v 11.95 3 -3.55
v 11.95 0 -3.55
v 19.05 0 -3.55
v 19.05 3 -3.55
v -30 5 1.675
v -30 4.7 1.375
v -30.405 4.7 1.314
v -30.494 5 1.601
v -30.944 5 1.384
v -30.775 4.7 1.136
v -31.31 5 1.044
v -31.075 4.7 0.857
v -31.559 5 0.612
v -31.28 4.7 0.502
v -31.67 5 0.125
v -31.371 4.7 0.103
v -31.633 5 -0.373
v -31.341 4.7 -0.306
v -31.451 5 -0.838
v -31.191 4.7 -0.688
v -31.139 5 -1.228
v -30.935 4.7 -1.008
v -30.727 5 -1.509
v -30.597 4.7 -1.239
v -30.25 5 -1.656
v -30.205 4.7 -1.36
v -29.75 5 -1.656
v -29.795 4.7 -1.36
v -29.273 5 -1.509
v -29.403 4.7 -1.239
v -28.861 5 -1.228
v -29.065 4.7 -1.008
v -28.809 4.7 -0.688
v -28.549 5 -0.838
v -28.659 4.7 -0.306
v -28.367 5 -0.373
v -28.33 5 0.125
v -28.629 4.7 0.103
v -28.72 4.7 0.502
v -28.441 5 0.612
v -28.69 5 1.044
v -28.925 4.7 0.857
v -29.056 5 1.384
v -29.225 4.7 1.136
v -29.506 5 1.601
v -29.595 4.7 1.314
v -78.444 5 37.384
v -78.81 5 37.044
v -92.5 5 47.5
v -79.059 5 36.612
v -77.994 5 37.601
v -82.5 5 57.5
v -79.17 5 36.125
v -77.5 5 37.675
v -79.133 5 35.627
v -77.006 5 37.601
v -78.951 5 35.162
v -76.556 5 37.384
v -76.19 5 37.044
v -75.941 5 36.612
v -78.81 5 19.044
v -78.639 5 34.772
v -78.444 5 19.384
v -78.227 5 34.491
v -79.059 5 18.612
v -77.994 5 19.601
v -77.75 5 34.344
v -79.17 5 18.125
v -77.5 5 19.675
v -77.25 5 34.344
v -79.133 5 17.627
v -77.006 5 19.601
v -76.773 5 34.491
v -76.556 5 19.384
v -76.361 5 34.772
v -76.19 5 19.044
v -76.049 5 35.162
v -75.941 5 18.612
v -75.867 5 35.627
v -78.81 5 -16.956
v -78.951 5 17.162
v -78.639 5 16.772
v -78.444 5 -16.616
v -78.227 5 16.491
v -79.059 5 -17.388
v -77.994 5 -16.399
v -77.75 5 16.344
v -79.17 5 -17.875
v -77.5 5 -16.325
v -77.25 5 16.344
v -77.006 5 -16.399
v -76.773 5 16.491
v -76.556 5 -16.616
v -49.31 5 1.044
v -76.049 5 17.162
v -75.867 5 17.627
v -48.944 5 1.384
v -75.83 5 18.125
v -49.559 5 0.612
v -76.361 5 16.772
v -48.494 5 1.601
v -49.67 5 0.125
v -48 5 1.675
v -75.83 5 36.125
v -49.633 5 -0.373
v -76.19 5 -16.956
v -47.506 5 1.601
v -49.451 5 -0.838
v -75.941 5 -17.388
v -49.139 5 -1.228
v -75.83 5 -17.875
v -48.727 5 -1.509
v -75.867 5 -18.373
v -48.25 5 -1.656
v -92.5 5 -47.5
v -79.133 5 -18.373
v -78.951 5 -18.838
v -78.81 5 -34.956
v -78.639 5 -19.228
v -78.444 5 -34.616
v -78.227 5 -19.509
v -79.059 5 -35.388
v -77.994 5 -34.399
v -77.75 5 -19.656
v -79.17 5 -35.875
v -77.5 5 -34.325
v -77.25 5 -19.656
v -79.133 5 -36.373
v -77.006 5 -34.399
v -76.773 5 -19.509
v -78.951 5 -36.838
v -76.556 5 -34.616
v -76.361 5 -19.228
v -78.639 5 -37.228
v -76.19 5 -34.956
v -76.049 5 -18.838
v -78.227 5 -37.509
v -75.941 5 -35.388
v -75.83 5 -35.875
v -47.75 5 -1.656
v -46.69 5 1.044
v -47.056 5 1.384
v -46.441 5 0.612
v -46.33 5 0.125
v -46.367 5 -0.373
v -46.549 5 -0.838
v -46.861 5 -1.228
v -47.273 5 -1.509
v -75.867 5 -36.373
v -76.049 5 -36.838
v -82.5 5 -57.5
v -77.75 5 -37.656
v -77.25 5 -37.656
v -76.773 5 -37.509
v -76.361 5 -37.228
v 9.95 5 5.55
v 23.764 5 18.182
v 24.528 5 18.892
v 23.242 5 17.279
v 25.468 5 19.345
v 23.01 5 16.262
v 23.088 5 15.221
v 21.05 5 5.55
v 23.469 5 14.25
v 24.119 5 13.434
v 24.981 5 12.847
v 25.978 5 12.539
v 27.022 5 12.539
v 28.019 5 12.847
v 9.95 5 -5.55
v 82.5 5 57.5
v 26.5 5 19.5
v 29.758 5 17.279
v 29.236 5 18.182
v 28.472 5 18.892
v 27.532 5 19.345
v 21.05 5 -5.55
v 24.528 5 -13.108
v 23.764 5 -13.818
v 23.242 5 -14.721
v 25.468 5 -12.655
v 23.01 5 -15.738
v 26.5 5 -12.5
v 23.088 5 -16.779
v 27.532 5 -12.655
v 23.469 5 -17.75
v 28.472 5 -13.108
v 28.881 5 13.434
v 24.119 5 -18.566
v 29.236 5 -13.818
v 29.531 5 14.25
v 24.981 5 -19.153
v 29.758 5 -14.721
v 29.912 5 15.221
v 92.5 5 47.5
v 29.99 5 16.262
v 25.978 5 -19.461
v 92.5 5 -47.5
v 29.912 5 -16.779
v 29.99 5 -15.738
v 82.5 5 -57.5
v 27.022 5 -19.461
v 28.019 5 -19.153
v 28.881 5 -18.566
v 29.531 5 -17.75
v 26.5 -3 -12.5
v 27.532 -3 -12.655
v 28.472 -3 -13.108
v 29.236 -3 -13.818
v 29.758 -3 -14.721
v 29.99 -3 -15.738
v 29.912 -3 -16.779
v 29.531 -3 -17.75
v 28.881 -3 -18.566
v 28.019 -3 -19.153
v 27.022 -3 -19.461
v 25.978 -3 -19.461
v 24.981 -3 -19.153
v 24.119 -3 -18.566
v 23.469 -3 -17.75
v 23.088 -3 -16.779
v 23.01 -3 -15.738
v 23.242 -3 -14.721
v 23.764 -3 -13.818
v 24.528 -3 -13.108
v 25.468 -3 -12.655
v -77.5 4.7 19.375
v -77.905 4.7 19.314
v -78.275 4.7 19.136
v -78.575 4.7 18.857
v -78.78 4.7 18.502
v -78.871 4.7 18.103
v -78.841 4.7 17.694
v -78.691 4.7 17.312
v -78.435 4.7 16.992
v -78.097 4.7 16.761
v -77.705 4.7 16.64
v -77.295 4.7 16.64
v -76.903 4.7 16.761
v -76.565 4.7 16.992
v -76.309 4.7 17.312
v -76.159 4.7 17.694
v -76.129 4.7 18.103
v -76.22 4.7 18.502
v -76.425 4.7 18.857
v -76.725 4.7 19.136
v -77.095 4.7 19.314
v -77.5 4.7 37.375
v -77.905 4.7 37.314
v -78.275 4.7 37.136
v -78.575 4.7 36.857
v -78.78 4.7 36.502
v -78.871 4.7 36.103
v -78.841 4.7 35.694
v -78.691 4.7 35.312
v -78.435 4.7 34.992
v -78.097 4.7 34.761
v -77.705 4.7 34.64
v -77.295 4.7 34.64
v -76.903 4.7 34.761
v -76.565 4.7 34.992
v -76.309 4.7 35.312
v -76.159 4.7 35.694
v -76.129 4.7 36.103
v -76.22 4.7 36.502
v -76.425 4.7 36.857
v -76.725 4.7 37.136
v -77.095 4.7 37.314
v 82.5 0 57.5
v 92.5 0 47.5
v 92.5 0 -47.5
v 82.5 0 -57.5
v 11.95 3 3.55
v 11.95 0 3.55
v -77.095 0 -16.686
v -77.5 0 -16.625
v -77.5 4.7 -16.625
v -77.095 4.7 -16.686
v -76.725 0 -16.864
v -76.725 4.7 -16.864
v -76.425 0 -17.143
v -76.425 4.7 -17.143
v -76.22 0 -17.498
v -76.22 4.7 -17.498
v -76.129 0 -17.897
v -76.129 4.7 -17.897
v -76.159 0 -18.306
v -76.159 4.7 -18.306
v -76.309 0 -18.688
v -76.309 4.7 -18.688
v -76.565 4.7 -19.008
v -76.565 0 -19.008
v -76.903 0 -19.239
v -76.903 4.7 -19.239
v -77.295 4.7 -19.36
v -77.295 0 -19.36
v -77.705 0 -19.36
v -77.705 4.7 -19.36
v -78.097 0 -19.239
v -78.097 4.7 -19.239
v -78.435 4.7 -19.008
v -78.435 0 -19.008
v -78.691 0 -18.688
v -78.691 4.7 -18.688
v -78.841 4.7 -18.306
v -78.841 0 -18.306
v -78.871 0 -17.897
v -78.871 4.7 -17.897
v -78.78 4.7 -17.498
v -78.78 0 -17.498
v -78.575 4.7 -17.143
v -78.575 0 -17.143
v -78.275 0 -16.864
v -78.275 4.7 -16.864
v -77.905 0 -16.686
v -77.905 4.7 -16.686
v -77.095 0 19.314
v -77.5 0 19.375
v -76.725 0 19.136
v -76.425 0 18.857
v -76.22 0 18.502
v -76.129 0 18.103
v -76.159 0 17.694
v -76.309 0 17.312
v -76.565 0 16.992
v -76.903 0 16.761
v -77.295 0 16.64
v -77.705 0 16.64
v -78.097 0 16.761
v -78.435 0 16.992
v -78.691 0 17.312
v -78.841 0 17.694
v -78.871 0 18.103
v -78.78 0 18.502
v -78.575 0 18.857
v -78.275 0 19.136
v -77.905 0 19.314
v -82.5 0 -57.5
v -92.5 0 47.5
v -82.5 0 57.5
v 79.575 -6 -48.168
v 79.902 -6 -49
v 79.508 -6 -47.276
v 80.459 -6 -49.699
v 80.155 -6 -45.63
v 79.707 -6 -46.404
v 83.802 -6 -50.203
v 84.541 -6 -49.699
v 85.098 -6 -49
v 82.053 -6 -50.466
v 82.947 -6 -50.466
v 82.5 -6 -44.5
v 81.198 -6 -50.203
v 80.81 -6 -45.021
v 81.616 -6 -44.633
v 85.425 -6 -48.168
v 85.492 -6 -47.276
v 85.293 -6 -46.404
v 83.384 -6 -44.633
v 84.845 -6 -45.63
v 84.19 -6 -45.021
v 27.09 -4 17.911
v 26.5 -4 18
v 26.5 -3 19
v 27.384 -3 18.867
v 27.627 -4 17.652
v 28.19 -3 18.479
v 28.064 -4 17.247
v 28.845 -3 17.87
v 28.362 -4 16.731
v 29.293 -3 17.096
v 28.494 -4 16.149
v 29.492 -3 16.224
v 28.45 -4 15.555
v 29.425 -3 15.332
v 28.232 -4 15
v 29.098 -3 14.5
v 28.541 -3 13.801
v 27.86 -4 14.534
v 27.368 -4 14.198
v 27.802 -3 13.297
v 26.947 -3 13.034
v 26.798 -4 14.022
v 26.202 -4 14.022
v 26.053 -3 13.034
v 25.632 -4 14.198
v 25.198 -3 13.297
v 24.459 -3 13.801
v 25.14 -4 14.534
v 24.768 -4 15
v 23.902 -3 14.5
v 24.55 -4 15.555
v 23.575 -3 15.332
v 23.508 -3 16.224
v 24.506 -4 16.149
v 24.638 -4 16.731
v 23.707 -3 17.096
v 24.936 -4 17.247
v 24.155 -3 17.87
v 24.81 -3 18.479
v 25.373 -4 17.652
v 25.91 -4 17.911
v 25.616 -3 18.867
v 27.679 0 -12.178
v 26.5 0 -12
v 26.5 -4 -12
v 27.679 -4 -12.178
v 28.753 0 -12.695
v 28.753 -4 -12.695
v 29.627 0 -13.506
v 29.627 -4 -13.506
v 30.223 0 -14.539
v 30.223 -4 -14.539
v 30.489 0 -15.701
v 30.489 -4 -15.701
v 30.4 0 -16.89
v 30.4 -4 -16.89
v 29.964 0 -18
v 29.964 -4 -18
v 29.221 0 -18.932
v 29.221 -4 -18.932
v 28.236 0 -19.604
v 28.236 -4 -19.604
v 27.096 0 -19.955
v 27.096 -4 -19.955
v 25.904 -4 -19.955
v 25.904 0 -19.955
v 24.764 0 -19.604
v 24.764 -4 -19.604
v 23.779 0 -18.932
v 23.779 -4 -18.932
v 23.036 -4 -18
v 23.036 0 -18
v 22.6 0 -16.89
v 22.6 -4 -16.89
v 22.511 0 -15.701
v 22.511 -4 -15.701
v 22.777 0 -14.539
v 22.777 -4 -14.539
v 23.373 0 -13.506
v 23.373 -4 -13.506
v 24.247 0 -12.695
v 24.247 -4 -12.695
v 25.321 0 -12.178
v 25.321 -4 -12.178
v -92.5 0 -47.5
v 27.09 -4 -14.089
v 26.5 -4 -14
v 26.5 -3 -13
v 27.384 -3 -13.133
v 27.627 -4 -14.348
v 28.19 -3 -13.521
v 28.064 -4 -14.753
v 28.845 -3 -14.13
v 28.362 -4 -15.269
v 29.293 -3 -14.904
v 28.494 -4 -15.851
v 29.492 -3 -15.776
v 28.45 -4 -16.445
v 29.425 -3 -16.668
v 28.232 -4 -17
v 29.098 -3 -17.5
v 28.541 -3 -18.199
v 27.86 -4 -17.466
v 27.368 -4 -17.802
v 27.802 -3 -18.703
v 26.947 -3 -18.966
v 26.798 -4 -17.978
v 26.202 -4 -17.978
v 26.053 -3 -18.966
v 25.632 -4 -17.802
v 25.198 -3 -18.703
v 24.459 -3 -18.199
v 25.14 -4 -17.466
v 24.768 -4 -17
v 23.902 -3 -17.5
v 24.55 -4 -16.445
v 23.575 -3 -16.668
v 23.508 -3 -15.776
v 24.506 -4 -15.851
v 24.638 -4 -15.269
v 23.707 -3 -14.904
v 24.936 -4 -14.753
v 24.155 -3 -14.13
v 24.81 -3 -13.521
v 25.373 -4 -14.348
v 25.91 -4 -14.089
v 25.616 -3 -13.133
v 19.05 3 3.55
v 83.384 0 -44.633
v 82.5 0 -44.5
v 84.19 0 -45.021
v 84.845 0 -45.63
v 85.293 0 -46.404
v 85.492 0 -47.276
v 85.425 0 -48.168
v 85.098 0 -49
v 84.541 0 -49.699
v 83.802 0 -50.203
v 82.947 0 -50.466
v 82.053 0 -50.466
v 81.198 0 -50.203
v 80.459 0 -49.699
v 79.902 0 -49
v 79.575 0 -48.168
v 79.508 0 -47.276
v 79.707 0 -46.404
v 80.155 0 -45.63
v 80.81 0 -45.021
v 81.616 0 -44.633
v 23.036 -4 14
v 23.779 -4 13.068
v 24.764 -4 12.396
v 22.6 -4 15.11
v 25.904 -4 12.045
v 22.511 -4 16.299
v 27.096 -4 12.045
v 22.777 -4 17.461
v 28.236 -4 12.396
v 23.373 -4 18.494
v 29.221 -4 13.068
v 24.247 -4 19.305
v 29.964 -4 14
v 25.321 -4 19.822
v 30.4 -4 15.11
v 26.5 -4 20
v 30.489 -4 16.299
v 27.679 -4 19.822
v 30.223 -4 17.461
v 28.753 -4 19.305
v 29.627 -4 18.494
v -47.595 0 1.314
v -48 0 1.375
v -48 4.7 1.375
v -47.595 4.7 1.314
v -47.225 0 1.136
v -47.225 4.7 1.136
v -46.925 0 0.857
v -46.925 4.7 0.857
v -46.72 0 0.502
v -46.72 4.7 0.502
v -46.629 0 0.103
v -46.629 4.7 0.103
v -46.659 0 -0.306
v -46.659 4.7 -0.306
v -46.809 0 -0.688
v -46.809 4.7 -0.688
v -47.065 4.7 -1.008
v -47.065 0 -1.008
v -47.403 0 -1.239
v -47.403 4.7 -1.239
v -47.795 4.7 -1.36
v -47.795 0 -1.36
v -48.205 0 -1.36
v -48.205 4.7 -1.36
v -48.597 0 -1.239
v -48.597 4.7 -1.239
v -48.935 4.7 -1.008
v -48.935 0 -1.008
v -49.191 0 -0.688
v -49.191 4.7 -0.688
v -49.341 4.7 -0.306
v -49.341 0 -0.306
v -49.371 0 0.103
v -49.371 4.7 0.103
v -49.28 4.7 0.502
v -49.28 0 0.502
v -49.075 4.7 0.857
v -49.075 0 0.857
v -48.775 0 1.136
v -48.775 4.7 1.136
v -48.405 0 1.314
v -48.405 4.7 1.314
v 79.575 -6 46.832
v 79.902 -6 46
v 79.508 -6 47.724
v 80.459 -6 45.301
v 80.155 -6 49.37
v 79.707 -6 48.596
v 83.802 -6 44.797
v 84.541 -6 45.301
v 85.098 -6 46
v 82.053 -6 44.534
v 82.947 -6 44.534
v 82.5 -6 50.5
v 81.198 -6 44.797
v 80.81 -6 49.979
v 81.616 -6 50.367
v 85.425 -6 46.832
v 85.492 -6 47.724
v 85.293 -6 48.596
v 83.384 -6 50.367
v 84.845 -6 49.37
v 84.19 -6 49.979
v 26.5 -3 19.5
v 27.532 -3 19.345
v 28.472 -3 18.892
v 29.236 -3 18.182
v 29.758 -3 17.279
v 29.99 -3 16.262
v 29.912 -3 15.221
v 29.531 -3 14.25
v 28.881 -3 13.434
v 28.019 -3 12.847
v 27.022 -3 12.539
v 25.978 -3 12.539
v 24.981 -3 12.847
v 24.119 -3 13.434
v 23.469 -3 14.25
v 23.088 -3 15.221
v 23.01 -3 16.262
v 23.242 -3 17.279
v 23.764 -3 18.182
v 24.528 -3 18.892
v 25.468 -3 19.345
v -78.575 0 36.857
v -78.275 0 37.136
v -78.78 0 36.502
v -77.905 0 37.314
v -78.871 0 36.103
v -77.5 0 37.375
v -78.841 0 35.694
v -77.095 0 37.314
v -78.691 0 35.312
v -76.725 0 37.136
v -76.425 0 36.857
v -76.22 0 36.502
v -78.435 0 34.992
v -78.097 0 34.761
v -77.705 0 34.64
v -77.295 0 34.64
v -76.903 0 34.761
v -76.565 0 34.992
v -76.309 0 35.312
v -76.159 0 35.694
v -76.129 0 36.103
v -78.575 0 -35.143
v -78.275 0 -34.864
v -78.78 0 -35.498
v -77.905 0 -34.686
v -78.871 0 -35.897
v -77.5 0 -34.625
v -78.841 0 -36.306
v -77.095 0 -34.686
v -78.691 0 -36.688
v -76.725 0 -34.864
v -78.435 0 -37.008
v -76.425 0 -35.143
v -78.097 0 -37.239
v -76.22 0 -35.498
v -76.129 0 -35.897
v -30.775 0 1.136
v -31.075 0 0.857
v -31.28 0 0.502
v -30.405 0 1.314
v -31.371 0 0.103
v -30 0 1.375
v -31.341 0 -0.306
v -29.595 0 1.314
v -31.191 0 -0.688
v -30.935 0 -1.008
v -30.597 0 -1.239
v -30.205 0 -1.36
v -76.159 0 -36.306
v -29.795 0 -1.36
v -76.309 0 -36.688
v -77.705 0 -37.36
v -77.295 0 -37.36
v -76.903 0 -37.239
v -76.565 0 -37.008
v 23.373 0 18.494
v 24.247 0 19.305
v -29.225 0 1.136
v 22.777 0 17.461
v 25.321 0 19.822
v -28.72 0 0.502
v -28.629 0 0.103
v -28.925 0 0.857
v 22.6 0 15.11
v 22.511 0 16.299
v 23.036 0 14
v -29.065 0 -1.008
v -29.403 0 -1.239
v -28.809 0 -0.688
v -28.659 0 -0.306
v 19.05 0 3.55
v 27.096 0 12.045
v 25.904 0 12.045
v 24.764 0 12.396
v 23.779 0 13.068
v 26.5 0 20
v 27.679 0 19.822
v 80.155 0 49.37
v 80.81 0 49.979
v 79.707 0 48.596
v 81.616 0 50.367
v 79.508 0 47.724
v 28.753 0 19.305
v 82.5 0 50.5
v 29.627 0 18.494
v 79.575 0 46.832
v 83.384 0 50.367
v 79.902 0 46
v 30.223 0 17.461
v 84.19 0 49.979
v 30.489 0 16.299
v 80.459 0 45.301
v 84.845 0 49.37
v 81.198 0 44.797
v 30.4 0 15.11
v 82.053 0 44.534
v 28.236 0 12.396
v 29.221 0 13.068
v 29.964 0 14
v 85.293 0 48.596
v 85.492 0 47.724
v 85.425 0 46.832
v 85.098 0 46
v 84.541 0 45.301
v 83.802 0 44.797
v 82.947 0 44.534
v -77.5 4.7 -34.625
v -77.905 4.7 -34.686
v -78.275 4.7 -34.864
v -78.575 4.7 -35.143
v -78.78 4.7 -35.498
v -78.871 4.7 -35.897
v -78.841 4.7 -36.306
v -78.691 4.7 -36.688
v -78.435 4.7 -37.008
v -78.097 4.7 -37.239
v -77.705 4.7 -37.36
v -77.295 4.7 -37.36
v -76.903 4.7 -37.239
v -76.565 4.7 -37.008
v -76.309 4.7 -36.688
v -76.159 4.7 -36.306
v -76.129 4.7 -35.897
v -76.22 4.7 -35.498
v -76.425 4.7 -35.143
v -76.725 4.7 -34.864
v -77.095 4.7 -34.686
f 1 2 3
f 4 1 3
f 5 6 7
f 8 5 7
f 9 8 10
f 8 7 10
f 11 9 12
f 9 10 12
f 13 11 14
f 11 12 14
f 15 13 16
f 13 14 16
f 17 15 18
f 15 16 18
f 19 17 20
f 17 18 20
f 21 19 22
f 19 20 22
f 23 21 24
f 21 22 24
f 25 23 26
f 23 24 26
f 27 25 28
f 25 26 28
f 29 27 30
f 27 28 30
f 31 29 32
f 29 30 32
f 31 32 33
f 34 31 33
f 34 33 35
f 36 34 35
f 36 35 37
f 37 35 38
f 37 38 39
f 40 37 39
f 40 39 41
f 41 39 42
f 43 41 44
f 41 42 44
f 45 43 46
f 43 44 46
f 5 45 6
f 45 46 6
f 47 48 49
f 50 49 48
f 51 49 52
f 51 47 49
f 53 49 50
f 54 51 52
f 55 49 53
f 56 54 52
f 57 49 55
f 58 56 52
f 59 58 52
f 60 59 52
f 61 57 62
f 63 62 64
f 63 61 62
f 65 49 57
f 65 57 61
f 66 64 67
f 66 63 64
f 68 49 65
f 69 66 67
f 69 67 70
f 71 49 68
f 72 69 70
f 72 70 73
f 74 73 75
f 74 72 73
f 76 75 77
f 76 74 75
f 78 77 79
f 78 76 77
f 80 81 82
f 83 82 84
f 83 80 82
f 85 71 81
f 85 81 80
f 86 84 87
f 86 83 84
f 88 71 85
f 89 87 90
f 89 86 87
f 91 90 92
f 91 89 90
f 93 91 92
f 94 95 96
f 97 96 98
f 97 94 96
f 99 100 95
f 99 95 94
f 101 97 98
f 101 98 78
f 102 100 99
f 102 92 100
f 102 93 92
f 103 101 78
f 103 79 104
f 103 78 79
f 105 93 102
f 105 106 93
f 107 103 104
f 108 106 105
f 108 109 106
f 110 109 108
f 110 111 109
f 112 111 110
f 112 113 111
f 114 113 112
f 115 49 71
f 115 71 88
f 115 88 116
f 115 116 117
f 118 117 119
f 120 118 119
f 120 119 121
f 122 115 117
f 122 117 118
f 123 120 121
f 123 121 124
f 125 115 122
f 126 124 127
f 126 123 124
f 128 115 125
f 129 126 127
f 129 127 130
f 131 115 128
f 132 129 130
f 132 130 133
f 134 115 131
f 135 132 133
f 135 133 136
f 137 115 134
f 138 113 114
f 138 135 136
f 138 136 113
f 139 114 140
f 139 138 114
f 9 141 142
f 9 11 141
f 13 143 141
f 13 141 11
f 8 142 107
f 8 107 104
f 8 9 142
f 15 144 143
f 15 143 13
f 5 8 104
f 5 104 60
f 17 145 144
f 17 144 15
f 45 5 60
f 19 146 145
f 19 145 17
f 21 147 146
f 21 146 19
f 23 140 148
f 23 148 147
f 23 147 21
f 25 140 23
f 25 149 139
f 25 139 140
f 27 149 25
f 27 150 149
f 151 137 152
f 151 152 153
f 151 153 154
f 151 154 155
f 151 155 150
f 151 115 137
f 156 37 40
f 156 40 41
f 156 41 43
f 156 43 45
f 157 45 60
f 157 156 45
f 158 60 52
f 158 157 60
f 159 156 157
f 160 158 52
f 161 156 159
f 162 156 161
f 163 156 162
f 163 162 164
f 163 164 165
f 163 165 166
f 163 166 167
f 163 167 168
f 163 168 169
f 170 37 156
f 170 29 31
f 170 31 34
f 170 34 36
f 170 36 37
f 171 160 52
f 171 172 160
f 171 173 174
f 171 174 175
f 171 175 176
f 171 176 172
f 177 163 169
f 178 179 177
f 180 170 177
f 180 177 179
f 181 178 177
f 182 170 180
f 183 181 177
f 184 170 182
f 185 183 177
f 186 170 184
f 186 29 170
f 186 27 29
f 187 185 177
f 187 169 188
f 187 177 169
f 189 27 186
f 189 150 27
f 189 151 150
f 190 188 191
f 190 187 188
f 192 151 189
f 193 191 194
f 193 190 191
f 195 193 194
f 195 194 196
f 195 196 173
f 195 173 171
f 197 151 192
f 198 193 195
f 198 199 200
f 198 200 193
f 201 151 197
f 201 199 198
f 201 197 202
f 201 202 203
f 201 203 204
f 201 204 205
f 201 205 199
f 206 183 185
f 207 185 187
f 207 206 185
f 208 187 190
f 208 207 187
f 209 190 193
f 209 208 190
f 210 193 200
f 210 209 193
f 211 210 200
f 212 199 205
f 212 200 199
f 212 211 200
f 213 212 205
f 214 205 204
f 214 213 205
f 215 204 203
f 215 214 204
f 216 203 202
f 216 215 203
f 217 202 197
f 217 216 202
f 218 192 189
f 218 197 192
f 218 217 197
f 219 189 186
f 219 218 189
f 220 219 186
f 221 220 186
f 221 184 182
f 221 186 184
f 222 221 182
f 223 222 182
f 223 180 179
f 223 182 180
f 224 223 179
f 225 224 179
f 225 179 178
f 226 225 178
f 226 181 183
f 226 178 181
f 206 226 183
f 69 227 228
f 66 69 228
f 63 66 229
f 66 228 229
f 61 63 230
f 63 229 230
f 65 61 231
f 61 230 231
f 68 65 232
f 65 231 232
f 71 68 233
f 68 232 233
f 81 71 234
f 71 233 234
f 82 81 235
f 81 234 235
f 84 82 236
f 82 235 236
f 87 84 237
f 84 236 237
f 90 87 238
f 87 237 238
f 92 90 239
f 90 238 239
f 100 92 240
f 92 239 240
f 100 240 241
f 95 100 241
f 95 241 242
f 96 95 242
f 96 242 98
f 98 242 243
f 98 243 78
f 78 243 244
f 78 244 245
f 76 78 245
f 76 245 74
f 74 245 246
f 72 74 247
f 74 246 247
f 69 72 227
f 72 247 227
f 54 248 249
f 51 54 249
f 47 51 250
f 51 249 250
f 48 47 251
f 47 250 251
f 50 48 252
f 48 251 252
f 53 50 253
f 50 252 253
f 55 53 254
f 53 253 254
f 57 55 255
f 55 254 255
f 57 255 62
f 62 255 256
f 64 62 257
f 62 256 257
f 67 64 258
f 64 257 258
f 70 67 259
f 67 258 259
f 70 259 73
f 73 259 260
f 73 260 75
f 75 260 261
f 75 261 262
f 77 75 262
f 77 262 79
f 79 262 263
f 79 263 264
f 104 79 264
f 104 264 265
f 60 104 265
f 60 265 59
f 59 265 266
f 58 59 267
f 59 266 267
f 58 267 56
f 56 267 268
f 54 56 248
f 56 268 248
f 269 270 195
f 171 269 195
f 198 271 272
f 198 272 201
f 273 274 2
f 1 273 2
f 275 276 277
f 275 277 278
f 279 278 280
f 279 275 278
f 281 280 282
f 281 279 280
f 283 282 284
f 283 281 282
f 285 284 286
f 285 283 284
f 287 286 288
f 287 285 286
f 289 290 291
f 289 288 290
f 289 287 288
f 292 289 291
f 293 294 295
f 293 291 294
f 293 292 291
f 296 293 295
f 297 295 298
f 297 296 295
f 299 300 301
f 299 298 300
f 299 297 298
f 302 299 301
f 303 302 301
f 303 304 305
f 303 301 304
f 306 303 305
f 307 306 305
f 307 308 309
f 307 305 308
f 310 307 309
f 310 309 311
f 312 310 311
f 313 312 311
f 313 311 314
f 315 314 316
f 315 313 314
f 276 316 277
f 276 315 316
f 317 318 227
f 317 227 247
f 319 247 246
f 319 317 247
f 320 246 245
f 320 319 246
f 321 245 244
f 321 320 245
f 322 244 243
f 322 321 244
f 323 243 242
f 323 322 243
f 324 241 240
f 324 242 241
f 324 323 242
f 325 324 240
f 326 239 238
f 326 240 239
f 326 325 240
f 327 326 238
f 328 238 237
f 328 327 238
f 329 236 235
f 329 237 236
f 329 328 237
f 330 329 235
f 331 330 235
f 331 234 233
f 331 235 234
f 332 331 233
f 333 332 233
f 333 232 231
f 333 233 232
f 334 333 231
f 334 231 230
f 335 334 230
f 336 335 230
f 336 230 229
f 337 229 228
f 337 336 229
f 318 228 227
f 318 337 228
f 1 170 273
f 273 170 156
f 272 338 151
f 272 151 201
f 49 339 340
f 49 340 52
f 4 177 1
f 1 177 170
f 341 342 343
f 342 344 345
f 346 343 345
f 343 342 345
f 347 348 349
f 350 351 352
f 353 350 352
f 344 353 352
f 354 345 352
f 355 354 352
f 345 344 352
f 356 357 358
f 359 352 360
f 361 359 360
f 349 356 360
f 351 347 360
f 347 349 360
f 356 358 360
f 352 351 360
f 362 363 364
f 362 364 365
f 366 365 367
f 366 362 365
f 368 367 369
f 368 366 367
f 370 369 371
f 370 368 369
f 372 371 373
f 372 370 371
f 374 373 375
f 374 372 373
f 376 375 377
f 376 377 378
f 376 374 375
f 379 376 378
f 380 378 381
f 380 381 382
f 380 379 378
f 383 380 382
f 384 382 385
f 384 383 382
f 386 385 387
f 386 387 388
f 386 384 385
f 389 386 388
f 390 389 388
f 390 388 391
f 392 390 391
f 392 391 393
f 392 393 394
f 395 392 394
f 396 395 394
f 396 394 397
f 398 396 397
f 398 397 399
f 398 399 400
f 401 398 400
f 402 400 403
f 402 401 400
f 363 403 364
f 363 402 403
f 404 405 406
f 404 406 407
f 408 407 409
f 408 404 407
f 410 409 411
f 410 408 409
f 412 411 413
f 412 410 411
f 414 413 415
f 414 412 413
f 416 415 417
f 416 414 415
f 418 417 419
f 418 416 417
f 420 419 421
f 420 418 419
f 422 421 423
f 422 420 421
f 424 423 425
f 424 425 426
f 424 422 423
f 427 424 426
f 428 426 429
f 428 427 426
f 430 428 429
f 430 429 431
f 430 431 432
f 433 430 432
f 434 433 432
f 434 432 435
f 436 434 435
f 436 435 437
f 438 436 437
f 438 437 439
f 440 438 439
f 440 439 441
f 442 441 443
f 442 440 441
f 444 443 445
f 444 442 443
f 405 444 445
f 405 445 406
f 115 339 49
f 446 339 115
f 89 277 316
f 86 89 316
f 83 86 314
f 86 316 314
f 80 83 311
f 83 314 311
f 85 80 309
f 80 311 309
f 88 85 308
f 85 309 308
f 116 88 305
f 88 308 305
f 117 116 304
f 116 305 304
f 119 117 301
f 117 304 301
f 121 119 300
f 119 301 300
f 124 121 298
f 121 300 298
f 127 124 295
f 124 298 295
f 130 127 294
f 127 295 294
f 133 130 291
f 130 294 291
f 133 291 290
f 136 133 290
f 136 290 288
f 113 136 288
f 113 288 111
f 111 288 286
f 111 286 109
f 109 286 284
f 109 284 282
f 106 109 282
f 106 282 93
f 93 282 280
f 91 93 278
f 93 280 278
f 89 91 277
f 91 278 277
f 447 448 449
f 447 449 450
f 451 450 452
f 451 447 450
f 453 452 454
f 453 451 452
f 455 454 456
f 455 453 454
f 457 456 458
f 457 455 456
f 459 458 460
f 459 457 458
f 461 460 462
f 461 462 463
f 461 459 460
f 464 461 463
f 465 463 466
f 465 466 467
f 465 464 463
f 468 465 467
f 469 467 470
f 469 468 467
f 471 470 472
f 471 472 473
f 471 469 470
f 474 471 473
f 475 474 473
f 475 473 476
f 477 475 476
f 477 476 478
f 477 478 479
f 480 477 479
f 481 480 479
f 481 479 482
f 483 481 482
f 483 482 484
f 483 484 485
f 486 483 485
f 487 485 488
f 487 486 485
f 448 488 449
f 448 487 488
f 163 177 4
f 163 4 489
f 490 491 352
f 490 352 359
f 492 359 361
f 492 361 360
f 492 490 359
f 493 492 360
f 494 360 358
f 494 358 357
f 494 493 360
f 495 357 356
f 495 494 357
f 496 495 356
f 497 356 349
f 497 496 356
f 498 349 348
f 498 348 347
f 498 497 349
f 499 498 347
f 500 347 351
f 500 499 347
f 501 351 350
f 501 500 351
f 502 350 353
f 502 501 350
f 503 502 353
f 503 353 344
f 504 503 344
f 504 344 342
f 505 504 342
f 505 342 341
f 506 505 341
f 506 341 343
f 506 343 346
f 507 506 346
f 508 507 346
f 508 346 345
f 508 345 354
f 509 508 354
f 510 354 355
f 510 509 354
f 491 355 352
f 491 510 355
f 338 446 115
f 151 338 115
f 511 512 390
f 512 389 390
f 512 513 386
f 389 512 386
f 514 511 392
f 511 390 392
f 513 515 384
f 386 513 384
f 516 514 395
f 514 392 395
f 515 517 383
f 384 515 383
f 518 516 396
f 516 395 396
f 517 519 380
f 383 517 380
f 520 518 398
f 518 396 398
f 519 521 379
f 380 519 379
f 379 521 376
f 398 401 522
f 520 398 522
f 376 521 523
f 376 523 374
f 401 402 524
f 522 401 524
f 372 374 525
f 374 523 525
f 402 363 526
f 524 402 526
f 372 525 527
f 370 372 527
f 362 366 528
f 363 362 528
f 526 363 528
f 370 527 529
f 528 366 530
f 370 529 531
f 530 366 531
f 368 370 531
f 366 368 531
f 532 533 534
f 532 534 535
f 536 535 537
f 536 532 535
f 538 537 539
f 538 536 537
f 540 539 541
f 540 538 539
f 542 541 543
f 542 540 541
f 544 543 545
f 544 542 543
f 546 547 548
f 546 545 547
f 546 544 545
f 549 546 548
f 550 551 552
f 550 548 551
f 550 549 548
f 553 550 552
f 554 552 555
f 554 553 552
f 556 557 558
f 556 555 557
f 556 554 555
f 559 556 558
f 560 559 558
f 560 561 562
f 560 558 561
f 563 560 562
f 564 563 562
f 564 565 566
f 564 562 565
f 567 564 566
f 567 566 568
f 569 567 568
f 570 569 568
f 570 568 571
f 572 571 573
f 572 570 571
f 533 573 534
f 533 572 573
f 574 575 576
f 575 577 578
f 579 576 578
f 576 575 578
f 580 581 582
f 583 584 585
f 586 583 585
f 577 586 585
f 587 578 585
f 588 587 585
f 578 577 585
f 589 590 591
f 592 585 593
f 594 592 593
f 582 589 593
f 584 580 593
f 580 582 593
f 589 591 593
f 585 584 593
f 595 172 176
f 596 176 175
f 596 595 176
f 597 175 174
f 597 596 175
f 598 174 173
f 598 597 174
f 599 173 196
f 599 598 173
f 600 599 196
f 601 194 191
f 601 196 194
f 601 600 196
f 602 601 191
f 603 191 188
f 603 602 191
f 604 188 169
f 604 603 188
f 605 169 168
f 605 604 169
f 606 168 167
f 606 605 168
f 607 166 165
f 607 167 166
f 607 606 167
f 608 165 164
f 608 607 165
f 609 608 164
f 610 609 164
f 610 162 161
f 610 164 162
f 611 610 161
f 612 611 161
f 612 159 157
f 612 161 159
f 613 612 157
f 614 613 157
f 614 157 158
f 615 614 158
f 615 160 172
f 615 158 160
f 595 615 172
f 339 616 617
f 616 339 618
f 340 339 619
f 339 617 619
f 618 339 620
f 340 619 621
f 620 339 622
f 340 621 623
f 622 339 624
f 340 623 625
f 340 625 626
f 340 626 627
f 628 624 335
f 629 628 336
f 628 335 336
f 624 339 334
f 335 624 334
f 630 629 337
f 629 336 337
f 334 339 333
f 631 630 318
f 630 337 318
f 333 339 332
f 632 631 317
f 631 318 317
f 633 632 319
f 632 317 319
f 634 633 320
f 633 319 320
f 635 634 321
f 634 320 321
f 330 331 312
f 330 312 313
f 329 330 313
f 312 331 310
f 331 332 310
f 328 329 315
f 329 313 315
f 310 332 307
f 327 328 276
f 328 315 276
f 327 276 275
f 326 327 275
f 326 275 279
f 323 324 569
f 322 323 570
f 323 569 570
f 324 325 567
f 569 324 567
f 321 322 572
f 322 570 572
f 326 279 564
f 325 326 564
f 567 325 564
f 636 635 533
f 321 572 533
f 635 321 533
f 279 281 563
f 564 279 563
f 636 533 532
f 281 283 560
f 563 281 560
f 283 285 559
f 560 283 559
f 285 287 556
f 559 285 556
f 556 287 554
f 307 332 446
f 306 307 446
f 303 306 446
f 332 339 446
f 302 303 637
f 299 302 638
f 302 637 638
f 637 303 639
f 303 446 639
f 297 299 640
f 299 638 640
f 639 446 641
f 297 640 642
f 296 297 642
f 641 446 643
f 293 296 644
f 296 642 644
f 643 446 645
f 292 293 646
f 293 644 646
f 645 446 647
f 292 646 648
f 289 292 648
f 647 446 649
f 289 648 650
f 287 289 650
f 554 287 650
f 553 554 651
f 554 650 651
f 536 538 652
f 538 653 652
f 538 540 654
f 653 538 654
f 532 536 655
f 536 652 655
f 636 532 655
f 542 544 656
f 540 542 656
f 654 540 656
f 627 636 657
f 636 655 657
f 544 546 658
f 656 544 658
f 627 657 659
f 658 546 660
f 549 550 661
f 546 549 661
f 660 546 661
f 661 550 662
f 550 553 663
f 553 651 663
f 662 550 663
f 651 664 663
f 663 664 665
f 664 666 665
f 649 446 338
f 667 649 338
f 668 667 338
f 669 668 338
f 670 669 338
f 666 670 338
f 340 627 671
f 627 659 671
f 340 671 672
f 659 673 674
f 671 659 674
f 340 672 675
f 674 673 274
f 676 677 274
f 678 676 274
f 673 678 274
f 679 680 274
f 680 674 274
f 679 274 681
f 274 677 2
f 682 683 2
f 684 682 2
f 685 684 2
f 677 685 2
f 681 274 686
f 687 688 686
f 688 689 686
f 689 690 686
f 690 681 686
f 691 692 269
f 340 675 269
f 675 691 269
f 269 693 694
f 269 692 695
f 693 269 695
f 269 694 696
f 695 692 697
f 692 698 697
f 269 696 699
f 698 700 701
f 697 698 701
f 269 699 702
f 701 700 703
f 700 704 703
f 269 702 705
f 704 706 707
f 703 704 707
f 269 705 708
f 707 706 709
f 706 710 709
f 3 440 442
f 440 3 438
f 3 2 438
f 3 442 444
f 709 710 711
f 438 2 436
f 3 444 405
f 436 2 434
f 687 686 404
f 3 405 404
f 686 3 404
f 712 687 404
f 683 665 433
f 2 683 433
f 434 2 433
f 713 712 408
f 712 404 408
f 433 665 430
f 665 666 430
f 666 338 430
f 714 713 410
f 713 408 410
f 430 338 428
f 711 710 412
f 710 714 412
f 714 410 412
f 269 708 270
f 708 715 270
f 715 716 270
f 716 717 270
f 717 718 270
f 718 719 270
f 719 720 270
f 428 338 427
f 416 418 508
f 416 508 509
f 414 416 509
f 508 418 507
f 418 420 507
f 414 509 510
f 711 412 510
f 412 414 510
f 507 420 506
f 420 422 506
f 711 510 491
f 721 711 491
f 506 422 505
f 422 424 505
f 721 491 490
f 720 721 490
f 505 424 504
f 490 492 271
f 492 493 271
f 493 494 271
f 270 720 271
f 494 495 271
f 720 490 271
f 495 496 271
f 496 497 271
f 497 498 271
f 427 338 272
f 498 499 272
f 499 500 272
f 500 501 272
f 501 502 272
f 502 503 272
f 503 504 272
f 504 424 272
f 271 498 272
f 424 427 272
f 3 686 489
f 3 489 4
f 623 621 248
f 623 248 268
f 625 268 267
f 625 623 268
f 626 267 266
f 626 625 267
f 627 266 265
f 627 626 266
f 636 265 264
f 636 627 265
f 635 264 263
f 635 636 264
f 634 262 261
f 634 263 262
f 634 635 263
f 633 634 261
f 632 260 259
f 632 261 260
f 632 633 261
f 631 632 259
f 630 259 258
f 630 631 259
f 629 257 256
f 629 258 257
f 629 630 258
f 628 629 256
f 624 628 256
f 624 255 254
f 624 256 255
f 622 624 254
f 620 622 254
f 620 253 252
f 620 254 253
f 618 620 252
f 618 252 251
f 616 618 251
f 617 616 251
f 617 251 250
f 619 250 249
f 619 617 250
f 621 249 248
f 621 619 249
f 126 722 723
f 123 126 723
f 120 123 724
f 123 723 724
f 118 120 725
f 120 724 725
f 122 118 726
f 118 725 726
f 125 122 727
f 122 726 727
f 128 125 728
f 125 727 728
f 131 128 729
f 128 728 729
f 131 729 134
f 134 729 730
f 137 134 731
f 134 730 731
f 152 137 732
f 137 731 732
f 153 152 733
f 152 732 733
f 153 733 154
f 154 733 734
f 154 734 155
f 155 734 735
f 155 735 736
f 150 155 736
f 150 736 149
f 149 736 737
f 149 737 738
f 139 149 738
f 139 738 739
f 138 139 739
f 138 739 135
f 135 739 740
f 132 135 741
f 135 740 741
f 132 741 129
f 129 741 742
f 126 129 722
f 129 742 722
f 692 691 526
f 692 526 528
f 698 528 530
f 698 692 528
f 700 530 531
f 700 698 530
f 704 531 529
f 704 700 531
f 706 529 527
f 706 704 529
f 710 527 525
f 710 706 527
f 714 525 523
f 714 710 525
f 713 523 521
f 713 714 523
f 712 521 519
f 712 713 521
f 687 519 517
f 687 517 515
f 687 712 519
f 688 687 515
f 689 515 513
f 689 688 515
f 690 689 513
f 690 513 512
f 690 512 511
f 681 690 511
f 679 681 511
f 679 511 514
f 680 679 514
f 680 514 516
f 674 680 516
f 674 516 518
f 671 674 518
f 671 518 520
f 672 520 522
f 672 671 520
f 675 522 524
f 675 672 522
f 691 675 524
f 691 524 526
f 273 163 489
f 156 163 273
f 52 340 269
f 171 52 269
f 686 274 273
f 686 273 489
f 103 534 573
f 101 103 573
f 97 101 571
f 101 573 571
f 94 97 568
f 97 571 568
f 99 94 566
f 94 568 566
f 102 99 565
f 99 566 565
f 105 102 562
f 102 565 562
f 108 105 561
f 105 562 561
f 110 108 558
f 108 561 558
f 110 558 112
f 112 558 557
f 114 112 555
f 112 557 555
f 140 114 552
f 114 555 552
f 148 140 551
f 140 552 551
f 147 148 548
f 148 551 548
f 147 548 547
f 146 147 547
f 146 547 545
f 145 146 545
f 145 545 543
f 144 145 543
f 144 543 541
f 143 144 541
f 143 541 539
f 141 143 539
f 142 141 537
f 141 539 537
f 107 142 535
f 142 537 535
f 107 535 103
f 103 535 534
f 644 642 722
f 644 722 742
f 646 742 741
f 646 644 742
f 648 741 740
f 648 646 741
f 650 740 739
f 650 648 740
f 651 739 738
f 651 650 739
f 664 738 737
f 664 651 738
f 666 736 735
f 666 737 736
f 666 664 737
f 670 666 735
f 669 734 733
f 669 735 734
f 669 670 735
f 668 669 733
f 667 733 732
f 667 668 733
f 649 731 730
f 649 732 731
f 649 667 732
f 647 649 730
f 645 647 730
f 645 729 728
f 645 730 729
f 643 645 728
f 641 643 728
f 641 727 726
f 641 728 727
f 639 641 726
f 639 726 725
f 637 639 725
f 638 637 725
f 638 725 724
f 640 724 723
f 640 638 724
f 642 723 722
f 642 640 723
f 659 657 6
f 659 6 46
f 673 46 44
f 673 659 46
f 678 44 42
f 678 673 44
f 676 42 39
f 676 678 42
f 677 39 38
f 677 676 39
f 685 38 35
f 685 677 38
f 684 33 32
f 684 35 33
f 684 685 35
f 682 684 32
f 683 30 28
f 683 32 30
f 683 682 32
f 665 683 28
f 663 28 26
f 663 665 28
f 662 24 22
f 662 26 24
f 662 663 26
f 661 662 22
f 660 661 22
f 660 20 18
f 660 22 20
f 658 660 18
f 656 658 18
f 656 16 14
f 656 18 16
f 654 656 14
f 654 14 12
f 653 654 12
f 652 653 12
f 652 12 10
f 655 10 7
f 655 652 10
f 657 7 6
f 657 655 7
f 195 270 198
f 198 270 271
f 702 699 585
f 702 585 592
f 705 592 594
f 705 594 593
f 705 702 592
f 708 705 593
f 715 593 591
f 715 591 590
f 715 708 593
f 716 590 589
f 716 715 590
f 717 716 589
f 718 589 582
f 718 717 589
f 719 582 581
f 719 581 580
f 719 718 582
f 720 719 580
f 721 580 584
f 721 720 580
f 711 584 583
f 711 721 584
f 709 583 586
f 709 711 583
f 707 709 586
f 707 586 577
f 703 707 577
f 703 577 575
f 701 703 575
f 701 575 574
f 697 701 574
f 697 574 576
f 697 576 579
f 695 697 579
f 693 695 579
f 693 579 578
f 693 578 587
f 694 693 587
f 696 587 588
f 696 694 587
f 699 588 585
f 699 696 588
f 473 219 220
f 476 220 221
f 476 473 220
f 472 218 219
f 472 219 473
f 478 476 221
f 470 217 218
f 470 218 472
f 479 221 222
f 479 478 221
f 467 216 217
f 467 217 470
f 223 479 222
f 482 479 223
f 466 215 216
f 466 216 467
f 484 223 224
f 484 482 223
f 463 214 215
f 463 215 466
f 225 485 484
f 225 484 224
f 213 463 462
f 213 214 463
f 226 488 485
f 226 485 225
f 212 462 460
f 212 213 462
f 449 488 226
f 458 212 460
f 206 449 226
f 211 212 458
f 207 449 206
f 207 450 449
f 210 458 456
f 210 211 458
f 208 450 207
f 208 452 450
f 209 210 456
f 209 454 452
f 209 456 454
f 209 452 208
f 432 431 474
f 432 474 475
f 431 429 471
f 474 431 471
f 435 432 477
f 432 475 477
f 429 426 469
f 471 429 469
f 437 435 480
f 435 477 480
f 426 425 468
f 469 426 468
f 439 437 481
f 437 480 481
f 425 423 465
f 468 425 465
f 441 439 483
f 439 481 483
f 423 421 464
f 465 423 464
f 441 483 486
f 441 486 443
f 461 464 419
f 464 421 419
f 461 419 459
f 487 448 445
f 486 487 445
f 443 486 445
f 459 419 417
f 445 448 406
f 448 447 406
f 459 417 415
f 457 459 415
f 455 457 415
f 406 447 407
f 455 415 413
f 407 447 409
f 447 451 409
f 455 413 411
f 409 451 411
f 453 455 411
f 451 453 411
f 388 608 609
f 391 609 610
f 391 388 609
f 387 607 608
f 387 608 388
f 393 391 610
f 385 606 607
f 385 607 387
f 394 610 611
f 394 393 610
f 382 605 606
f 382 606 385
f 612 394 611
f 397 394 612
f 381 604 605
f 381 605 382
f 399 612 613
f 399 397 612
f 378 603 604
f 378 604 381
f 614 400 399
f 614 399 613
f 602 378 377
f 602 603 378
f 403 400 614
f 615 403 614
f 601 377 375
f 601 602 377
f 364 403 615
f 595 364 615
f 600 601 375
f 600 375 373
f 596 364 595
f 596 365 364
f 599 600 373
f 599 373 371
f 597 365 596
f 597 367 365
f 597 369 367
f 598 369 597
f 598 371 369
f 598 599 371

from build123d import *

# Parameters (mm, degrees)
SKETCH1_W               = 185
SKETCH1_H               = 115
BOSS_EXTRUDE2_DEPTH     = 5
CUT_EXTRUDE5_DEPTH      = 15
CUT_EXTRUDE5_DEPTH_BACK = 15
SKETCH1_7_OUTSIDE_W     = 230.578
SKETCH1_7_OUTSIDE_H     = 160.578
SKETCH1_7_OUTSIDE_W_2   = 185
SKETCH1_7_OUTSIDE_H_2   = 115
SKETCH1_7_OUTSIDE_R     = 1.375
CHAMFER2_SIZE           = 0.3
SKETCH10_R              = 3
BOSS_EXTRUDE3_DEPTH     = 6
SKETCH11_R              = 4
BOSS_EXTRUDE4_DEPTH     = 4
CUT_EXTRUDE6_DEPTH      = 10
CUT_EXTRUDE6_DEPTH_BACK = 3
SKETCH13_R              = 3.5
CUT_EXTRUDE8_DEPTH      = 7
CUT_EXTRUDE8_DEPTH_BACK = 7
SKETCH14_R              = 1.375
CHAMFER3_SIZE           = 1.625
CHAMFER6_SIZE           = 10
CUT_EXTRUDE9_DEPTH      = 10
CUT_EXTRUDE9_DEPTH_BACK = 10
SKETCH15_W              = 7.1
SKETCH15_H              = 7.1
CHAMFER7_SIZE           = 2


with BuildPart() as part:
    # Sketch1 → Boss-Extrude2 (new body)
    with BuildSketch(Plane(origin=(0, 0, 0), x_dir=(1, 0, 0), z_dir=(0, 1, 0))):
        Rectangle(SKETCH1_W, SKETCH1_H)
    extrude(amount=BOSS_EXTRUDE2_DEPTH)

    # Sketch1<7> outside → Cut-Extrude5 (cut, two sides: drawn at the far end of the back side and taken through both)
    # profile 1 of 9: a face of its own
    with BuildSketch(Plane(origin=(0, 0, 0), x_dir=(1, 0, 0), z_dir=(0, 1, 0)).offset(-CUT_EXTRUDE5_DEPTH_BACK)):
        Rectangle(SKETCH1_7_OUTSIDE_W, SKETCH1_7_OUTSIDE_H)
        Rectangle(SKETCH1_7_OUTSIDE_W_2, SKETCH1_7_OUTSIDE_H_2, mode=Mode.SUBTRACT)
    # profile 2 of 9: a face of its own
    with BuildSketch(Plane(origin=(0, 0, 0), x_dir=(1, 0, 0), z_dir=(0, 1, 0)).offset(-CUT_EXTRUDE5_DEPTH_BACK)):
        with Locations(Location((26.5, 16, 0), (0, 0, 270))):
            Circle(SKETCH1_7_OUTSIDE_R)
    # profile 3 of 9: a face of its own
    with BuildSketch(Plane(origin=(0, 0, 0), x_dir=(1, 0, 0), z_dir=(0, 1, 0)).offset(-CUT_EXTRUDE5_DEPTH_BACK)):
        with Locations(Location((26.5, -16, 0), (0, 0, 270))):
            Circle(SKETCH1_7_OUTSIDE_R)
    # profile 4 of 9: a face of its own
    with BuildSketch(Plane(origin=(0, 0, 0), x_dir=(1, 0, 0), z_dir=(0, 1, 0)).offset(-CUT_EXTRUDE5_DEPTH_BACK)):
        with Locations(Location((-77.5, 36, 0), (0, 0, 270))):
            Circle(SKETCH1_7_OUTSIDE_R)
    # profile 5 of 9: a face of its own
    with BuildSketch(Plane(origin=(0, 0, 0), x_dir=(1, 0, 0), z_dir=(0, 1, 0)).offset(-CUT_EXTRUDE5_DEPTH_BACK)):
        with Locations(Location((-77.5, 18, 0), (0, 0, 270))):
            Circle(SKETCH1_7_OUTSIDE_R)
    # profile 6 of 9: a face of its own
    with BuildSketch(Plane(origin=(0, 0, 0), x_dir=(1, 0, 0), z_dir=(0, 1, 0)).offset(-CUT_EXTRUDE5_DEPTH_BACK)):
        with Locations(Location((-77.5, -18, 0), (0, 0, 270))):
            Circle(SKETCH1_7_OUTSIDE_R)
    # profile 7 of 9: a face of its own
    with BuildSketch(Plane(origin=(0, 0, 0), x_dir=(1, 0, 0), z_dir=(0, 1, 0)).offset(-CUT_EXTRUDE5_DEPTH_BACK)):
        with Locations(Location((-77.5, -36, 0), (0, 0, 270))):
            Circle(SKETCH1_7_OUTSIDE_R)
    # profile 8 of 9: a face of its own
    with BuildSketch(Plane(origin=(0, 0, 0), x_dir=(1, 0, 0), z_dir=(0, 1, 0)).offset(-CUT_EXTRUDE5_DEPTH_BACK)):
        with Locations(Location((-48, 0, 0), (0, 0, 270))):
            Circle(SKETCH1_7_OUTSIDE_R)
    # profile 9 of 9: a face of its own
    with BuildSketch(Plane(origin=(0, 0, 0), x_dir=(1, 0, 0), z_dir=(0, 1, 0)).offset(-CUT_EXTRUDE5_DEPTH_BACK)):
        with Locations(Location((-30, 0, 0), (0, 0, 270))):
            Circle(SKETCH1_7_OUTSIDE_R)
    extrude(amount=CUT_EXTRUDE5_DEPTH + CUT_EXTRUDE5_DEPTH_BACK, mode=Mode.SUBTRACT)

    # Chamfer2
    chamfer2_edges = [part.edges().sort_by_distance(p)[0] for p in [
        (26.5, 5, -17.375),
        (26.5, 5, 14.625),
        (-77.5, 5, -37.375),
        (-77.5, 5, -19.375),
        (-77.5, 5, 16.625),
        (-77.5, 5, 34.625),
        (-48, 5, -1.375),
        (-30, 5, -1.375),
    ]]
    chamfer(chamfer2_edges, length=CHAMFER2_SIZE)

    # Sketch10 → Boss-Extrude3 (add)
    with BuildSketch(Plane(origin=(0, 0, 0), x_dir=(1, 0, 0), z_dir=(0, 1, 0))):
        with Locations(Location((82.5, -47.5, 0), (0, 0, 270))):
            Circle(SKETCH10_R)
        with Locations(Location((82.5, 47.5, 0), (0, 0, 270))):
            Circle(SKETCH10_R)
    extrude(amount=-BOSS_EXTRUDE3_DEPTH)

    # Sketch11 → Boss-Extrude4 (add)
    with BuildSketch(Plane(origin=(0, 0, 0), x_dir=(1, 0, 0), z_dir=(0, 1, 0))):
        with Locations(Location((26.5, -16, 0), (0, 0, 270))):
            Circle(SKETCH11_R)
        with Locations(Location((26.5, 16, 0), (0, 0, 270))):
            Circle(SKETCH11_R)
    extrude(amount=-BOSS_EXTRUDE4_DEPTH)

    # Sketch13 → Cut-Extrude6 (cut, two sides: drawn at the far end of the back side and taken through both)
    with BuildSketch(Plane(origin=(0, 0, 0), x_dir=(1, 0, 0), z_dir=(0, 1, 0)).offset(-CUT_EXTRUDE6_DEPTH_BACK)):
        with Locations(Location((26.5, 16, 0), (0, 0, 270))):
            Circle(SKETCH13_R)
        with Locations(Location((26.5, -16, 0), (0, 0, 270))):
            Circle(SKETCH13_R)
    extrude(amount=CUT_EXTRUDE6_DEPTH + CUT_EXTRUDE6_DEPTH_BACK, mode=Mode.SUBTRACT)

    # Sketch14 → Cut-Extrude8 (cut, two sides: drawn at the far end of the back side and taken through both)
    with BuildSketch(Plane(origin=(0, 0, 0), x_dir=(1, 0, 0), z_dir=(0, 1, 0)).offset(-CUT_EXTRUDE8_DEPTH_BACK)):
        with Locations(Location((26.5, 16, 0), (0, 0, 270))):
            Circle(SKETCH14_R)
        with Locations(Location((26.5, -16, 0), (0, 0, 270))):
            Circle(SKETCH14_R)
    extrude(amount=CUT_EXTRUDE8_DEPTH + CUT_EXTRUDE8_DEPTH_BACK, mode=Mode.SUBTRACT)

    # Chamfer3
    # the kernel refuses this chamfer: 1.625 mm, written as the material it takes off along each edge
    with BuildSketch(Plane(origin=(26.5, -3, 16), x_dir=(0, 0, 1), z_dir=(-1, 0, 0))) as chamfer3_piece_1:
        Polygon((1.375 + CHAMFER3_SIZE, 0), (1.375, -CHAMFER3_SIZE), (1.375, 0), align=None)
    revolve(axis=Axis((26.5, -3, 16), (0, 1, 0)), mode=Mode.SUBTRACT)
    with BuildSketch(Plane(origin=(26.5, -3, -16), x_dir=(0, 0, 1), z_dir=(-1, 0, 0))) as chamfer3_piece_2:
        Polygon((1.375 + CHAMFER3_SIZE, 0), (1.375, -CHAMFER3_SIZE), (1.375, 0), align=None)
    revolve(axis=Axis((26.5, -3, -16), (0, 1, 0)), mode=Mode.SUBTRACT)

    # Chamfer6
    chamfer6_edges = [part.edges().sort_by_distance(p)[0] for p in [
        (-92.5, 2.5, -57.5),
        (92.5, 2.5, -57.5),
        (92.5, 2.5, 57.5),
        (-92.5, 2.5, 57.5),
    ]]
    chamfer(chamfer6_edges, length=CHAMFER6_SIZE)

    # Sketch15 → Cut-Extrude9 (cut, two sides: drawn at the far end of the back side and taken through both)
    with BuildSketch(Plane(origin=(0, 5, 0), x_dir=(1, 0, 0), z_dir=(0, 1, 0)).offset(-CUT_EXTRUDE9_DEPTH_BACK)):
        with Locations((15.5, 0)):
            Rectangle(SKETCH15_W, SKETCH15_H)
    extrude(amount=CUT_EXTRUDE9_DEPTH + CUT_EXTRUDE9_DEPTH_BACK, mode=Mode.SUBTRACT)

    # Chamfer7
    chamfer7_edges = [part.edges().sort_by_distance(p)[0] for p in [
        (19.05, 5, 0),
        (15.5, 5, -3.55),
        (11.95, 5, 0),
        (15.5, 5, 3.55),
    ]]
    chamfer(chamfer7_edges, length=CHAMFER7_SIZE)


solid = part.part
